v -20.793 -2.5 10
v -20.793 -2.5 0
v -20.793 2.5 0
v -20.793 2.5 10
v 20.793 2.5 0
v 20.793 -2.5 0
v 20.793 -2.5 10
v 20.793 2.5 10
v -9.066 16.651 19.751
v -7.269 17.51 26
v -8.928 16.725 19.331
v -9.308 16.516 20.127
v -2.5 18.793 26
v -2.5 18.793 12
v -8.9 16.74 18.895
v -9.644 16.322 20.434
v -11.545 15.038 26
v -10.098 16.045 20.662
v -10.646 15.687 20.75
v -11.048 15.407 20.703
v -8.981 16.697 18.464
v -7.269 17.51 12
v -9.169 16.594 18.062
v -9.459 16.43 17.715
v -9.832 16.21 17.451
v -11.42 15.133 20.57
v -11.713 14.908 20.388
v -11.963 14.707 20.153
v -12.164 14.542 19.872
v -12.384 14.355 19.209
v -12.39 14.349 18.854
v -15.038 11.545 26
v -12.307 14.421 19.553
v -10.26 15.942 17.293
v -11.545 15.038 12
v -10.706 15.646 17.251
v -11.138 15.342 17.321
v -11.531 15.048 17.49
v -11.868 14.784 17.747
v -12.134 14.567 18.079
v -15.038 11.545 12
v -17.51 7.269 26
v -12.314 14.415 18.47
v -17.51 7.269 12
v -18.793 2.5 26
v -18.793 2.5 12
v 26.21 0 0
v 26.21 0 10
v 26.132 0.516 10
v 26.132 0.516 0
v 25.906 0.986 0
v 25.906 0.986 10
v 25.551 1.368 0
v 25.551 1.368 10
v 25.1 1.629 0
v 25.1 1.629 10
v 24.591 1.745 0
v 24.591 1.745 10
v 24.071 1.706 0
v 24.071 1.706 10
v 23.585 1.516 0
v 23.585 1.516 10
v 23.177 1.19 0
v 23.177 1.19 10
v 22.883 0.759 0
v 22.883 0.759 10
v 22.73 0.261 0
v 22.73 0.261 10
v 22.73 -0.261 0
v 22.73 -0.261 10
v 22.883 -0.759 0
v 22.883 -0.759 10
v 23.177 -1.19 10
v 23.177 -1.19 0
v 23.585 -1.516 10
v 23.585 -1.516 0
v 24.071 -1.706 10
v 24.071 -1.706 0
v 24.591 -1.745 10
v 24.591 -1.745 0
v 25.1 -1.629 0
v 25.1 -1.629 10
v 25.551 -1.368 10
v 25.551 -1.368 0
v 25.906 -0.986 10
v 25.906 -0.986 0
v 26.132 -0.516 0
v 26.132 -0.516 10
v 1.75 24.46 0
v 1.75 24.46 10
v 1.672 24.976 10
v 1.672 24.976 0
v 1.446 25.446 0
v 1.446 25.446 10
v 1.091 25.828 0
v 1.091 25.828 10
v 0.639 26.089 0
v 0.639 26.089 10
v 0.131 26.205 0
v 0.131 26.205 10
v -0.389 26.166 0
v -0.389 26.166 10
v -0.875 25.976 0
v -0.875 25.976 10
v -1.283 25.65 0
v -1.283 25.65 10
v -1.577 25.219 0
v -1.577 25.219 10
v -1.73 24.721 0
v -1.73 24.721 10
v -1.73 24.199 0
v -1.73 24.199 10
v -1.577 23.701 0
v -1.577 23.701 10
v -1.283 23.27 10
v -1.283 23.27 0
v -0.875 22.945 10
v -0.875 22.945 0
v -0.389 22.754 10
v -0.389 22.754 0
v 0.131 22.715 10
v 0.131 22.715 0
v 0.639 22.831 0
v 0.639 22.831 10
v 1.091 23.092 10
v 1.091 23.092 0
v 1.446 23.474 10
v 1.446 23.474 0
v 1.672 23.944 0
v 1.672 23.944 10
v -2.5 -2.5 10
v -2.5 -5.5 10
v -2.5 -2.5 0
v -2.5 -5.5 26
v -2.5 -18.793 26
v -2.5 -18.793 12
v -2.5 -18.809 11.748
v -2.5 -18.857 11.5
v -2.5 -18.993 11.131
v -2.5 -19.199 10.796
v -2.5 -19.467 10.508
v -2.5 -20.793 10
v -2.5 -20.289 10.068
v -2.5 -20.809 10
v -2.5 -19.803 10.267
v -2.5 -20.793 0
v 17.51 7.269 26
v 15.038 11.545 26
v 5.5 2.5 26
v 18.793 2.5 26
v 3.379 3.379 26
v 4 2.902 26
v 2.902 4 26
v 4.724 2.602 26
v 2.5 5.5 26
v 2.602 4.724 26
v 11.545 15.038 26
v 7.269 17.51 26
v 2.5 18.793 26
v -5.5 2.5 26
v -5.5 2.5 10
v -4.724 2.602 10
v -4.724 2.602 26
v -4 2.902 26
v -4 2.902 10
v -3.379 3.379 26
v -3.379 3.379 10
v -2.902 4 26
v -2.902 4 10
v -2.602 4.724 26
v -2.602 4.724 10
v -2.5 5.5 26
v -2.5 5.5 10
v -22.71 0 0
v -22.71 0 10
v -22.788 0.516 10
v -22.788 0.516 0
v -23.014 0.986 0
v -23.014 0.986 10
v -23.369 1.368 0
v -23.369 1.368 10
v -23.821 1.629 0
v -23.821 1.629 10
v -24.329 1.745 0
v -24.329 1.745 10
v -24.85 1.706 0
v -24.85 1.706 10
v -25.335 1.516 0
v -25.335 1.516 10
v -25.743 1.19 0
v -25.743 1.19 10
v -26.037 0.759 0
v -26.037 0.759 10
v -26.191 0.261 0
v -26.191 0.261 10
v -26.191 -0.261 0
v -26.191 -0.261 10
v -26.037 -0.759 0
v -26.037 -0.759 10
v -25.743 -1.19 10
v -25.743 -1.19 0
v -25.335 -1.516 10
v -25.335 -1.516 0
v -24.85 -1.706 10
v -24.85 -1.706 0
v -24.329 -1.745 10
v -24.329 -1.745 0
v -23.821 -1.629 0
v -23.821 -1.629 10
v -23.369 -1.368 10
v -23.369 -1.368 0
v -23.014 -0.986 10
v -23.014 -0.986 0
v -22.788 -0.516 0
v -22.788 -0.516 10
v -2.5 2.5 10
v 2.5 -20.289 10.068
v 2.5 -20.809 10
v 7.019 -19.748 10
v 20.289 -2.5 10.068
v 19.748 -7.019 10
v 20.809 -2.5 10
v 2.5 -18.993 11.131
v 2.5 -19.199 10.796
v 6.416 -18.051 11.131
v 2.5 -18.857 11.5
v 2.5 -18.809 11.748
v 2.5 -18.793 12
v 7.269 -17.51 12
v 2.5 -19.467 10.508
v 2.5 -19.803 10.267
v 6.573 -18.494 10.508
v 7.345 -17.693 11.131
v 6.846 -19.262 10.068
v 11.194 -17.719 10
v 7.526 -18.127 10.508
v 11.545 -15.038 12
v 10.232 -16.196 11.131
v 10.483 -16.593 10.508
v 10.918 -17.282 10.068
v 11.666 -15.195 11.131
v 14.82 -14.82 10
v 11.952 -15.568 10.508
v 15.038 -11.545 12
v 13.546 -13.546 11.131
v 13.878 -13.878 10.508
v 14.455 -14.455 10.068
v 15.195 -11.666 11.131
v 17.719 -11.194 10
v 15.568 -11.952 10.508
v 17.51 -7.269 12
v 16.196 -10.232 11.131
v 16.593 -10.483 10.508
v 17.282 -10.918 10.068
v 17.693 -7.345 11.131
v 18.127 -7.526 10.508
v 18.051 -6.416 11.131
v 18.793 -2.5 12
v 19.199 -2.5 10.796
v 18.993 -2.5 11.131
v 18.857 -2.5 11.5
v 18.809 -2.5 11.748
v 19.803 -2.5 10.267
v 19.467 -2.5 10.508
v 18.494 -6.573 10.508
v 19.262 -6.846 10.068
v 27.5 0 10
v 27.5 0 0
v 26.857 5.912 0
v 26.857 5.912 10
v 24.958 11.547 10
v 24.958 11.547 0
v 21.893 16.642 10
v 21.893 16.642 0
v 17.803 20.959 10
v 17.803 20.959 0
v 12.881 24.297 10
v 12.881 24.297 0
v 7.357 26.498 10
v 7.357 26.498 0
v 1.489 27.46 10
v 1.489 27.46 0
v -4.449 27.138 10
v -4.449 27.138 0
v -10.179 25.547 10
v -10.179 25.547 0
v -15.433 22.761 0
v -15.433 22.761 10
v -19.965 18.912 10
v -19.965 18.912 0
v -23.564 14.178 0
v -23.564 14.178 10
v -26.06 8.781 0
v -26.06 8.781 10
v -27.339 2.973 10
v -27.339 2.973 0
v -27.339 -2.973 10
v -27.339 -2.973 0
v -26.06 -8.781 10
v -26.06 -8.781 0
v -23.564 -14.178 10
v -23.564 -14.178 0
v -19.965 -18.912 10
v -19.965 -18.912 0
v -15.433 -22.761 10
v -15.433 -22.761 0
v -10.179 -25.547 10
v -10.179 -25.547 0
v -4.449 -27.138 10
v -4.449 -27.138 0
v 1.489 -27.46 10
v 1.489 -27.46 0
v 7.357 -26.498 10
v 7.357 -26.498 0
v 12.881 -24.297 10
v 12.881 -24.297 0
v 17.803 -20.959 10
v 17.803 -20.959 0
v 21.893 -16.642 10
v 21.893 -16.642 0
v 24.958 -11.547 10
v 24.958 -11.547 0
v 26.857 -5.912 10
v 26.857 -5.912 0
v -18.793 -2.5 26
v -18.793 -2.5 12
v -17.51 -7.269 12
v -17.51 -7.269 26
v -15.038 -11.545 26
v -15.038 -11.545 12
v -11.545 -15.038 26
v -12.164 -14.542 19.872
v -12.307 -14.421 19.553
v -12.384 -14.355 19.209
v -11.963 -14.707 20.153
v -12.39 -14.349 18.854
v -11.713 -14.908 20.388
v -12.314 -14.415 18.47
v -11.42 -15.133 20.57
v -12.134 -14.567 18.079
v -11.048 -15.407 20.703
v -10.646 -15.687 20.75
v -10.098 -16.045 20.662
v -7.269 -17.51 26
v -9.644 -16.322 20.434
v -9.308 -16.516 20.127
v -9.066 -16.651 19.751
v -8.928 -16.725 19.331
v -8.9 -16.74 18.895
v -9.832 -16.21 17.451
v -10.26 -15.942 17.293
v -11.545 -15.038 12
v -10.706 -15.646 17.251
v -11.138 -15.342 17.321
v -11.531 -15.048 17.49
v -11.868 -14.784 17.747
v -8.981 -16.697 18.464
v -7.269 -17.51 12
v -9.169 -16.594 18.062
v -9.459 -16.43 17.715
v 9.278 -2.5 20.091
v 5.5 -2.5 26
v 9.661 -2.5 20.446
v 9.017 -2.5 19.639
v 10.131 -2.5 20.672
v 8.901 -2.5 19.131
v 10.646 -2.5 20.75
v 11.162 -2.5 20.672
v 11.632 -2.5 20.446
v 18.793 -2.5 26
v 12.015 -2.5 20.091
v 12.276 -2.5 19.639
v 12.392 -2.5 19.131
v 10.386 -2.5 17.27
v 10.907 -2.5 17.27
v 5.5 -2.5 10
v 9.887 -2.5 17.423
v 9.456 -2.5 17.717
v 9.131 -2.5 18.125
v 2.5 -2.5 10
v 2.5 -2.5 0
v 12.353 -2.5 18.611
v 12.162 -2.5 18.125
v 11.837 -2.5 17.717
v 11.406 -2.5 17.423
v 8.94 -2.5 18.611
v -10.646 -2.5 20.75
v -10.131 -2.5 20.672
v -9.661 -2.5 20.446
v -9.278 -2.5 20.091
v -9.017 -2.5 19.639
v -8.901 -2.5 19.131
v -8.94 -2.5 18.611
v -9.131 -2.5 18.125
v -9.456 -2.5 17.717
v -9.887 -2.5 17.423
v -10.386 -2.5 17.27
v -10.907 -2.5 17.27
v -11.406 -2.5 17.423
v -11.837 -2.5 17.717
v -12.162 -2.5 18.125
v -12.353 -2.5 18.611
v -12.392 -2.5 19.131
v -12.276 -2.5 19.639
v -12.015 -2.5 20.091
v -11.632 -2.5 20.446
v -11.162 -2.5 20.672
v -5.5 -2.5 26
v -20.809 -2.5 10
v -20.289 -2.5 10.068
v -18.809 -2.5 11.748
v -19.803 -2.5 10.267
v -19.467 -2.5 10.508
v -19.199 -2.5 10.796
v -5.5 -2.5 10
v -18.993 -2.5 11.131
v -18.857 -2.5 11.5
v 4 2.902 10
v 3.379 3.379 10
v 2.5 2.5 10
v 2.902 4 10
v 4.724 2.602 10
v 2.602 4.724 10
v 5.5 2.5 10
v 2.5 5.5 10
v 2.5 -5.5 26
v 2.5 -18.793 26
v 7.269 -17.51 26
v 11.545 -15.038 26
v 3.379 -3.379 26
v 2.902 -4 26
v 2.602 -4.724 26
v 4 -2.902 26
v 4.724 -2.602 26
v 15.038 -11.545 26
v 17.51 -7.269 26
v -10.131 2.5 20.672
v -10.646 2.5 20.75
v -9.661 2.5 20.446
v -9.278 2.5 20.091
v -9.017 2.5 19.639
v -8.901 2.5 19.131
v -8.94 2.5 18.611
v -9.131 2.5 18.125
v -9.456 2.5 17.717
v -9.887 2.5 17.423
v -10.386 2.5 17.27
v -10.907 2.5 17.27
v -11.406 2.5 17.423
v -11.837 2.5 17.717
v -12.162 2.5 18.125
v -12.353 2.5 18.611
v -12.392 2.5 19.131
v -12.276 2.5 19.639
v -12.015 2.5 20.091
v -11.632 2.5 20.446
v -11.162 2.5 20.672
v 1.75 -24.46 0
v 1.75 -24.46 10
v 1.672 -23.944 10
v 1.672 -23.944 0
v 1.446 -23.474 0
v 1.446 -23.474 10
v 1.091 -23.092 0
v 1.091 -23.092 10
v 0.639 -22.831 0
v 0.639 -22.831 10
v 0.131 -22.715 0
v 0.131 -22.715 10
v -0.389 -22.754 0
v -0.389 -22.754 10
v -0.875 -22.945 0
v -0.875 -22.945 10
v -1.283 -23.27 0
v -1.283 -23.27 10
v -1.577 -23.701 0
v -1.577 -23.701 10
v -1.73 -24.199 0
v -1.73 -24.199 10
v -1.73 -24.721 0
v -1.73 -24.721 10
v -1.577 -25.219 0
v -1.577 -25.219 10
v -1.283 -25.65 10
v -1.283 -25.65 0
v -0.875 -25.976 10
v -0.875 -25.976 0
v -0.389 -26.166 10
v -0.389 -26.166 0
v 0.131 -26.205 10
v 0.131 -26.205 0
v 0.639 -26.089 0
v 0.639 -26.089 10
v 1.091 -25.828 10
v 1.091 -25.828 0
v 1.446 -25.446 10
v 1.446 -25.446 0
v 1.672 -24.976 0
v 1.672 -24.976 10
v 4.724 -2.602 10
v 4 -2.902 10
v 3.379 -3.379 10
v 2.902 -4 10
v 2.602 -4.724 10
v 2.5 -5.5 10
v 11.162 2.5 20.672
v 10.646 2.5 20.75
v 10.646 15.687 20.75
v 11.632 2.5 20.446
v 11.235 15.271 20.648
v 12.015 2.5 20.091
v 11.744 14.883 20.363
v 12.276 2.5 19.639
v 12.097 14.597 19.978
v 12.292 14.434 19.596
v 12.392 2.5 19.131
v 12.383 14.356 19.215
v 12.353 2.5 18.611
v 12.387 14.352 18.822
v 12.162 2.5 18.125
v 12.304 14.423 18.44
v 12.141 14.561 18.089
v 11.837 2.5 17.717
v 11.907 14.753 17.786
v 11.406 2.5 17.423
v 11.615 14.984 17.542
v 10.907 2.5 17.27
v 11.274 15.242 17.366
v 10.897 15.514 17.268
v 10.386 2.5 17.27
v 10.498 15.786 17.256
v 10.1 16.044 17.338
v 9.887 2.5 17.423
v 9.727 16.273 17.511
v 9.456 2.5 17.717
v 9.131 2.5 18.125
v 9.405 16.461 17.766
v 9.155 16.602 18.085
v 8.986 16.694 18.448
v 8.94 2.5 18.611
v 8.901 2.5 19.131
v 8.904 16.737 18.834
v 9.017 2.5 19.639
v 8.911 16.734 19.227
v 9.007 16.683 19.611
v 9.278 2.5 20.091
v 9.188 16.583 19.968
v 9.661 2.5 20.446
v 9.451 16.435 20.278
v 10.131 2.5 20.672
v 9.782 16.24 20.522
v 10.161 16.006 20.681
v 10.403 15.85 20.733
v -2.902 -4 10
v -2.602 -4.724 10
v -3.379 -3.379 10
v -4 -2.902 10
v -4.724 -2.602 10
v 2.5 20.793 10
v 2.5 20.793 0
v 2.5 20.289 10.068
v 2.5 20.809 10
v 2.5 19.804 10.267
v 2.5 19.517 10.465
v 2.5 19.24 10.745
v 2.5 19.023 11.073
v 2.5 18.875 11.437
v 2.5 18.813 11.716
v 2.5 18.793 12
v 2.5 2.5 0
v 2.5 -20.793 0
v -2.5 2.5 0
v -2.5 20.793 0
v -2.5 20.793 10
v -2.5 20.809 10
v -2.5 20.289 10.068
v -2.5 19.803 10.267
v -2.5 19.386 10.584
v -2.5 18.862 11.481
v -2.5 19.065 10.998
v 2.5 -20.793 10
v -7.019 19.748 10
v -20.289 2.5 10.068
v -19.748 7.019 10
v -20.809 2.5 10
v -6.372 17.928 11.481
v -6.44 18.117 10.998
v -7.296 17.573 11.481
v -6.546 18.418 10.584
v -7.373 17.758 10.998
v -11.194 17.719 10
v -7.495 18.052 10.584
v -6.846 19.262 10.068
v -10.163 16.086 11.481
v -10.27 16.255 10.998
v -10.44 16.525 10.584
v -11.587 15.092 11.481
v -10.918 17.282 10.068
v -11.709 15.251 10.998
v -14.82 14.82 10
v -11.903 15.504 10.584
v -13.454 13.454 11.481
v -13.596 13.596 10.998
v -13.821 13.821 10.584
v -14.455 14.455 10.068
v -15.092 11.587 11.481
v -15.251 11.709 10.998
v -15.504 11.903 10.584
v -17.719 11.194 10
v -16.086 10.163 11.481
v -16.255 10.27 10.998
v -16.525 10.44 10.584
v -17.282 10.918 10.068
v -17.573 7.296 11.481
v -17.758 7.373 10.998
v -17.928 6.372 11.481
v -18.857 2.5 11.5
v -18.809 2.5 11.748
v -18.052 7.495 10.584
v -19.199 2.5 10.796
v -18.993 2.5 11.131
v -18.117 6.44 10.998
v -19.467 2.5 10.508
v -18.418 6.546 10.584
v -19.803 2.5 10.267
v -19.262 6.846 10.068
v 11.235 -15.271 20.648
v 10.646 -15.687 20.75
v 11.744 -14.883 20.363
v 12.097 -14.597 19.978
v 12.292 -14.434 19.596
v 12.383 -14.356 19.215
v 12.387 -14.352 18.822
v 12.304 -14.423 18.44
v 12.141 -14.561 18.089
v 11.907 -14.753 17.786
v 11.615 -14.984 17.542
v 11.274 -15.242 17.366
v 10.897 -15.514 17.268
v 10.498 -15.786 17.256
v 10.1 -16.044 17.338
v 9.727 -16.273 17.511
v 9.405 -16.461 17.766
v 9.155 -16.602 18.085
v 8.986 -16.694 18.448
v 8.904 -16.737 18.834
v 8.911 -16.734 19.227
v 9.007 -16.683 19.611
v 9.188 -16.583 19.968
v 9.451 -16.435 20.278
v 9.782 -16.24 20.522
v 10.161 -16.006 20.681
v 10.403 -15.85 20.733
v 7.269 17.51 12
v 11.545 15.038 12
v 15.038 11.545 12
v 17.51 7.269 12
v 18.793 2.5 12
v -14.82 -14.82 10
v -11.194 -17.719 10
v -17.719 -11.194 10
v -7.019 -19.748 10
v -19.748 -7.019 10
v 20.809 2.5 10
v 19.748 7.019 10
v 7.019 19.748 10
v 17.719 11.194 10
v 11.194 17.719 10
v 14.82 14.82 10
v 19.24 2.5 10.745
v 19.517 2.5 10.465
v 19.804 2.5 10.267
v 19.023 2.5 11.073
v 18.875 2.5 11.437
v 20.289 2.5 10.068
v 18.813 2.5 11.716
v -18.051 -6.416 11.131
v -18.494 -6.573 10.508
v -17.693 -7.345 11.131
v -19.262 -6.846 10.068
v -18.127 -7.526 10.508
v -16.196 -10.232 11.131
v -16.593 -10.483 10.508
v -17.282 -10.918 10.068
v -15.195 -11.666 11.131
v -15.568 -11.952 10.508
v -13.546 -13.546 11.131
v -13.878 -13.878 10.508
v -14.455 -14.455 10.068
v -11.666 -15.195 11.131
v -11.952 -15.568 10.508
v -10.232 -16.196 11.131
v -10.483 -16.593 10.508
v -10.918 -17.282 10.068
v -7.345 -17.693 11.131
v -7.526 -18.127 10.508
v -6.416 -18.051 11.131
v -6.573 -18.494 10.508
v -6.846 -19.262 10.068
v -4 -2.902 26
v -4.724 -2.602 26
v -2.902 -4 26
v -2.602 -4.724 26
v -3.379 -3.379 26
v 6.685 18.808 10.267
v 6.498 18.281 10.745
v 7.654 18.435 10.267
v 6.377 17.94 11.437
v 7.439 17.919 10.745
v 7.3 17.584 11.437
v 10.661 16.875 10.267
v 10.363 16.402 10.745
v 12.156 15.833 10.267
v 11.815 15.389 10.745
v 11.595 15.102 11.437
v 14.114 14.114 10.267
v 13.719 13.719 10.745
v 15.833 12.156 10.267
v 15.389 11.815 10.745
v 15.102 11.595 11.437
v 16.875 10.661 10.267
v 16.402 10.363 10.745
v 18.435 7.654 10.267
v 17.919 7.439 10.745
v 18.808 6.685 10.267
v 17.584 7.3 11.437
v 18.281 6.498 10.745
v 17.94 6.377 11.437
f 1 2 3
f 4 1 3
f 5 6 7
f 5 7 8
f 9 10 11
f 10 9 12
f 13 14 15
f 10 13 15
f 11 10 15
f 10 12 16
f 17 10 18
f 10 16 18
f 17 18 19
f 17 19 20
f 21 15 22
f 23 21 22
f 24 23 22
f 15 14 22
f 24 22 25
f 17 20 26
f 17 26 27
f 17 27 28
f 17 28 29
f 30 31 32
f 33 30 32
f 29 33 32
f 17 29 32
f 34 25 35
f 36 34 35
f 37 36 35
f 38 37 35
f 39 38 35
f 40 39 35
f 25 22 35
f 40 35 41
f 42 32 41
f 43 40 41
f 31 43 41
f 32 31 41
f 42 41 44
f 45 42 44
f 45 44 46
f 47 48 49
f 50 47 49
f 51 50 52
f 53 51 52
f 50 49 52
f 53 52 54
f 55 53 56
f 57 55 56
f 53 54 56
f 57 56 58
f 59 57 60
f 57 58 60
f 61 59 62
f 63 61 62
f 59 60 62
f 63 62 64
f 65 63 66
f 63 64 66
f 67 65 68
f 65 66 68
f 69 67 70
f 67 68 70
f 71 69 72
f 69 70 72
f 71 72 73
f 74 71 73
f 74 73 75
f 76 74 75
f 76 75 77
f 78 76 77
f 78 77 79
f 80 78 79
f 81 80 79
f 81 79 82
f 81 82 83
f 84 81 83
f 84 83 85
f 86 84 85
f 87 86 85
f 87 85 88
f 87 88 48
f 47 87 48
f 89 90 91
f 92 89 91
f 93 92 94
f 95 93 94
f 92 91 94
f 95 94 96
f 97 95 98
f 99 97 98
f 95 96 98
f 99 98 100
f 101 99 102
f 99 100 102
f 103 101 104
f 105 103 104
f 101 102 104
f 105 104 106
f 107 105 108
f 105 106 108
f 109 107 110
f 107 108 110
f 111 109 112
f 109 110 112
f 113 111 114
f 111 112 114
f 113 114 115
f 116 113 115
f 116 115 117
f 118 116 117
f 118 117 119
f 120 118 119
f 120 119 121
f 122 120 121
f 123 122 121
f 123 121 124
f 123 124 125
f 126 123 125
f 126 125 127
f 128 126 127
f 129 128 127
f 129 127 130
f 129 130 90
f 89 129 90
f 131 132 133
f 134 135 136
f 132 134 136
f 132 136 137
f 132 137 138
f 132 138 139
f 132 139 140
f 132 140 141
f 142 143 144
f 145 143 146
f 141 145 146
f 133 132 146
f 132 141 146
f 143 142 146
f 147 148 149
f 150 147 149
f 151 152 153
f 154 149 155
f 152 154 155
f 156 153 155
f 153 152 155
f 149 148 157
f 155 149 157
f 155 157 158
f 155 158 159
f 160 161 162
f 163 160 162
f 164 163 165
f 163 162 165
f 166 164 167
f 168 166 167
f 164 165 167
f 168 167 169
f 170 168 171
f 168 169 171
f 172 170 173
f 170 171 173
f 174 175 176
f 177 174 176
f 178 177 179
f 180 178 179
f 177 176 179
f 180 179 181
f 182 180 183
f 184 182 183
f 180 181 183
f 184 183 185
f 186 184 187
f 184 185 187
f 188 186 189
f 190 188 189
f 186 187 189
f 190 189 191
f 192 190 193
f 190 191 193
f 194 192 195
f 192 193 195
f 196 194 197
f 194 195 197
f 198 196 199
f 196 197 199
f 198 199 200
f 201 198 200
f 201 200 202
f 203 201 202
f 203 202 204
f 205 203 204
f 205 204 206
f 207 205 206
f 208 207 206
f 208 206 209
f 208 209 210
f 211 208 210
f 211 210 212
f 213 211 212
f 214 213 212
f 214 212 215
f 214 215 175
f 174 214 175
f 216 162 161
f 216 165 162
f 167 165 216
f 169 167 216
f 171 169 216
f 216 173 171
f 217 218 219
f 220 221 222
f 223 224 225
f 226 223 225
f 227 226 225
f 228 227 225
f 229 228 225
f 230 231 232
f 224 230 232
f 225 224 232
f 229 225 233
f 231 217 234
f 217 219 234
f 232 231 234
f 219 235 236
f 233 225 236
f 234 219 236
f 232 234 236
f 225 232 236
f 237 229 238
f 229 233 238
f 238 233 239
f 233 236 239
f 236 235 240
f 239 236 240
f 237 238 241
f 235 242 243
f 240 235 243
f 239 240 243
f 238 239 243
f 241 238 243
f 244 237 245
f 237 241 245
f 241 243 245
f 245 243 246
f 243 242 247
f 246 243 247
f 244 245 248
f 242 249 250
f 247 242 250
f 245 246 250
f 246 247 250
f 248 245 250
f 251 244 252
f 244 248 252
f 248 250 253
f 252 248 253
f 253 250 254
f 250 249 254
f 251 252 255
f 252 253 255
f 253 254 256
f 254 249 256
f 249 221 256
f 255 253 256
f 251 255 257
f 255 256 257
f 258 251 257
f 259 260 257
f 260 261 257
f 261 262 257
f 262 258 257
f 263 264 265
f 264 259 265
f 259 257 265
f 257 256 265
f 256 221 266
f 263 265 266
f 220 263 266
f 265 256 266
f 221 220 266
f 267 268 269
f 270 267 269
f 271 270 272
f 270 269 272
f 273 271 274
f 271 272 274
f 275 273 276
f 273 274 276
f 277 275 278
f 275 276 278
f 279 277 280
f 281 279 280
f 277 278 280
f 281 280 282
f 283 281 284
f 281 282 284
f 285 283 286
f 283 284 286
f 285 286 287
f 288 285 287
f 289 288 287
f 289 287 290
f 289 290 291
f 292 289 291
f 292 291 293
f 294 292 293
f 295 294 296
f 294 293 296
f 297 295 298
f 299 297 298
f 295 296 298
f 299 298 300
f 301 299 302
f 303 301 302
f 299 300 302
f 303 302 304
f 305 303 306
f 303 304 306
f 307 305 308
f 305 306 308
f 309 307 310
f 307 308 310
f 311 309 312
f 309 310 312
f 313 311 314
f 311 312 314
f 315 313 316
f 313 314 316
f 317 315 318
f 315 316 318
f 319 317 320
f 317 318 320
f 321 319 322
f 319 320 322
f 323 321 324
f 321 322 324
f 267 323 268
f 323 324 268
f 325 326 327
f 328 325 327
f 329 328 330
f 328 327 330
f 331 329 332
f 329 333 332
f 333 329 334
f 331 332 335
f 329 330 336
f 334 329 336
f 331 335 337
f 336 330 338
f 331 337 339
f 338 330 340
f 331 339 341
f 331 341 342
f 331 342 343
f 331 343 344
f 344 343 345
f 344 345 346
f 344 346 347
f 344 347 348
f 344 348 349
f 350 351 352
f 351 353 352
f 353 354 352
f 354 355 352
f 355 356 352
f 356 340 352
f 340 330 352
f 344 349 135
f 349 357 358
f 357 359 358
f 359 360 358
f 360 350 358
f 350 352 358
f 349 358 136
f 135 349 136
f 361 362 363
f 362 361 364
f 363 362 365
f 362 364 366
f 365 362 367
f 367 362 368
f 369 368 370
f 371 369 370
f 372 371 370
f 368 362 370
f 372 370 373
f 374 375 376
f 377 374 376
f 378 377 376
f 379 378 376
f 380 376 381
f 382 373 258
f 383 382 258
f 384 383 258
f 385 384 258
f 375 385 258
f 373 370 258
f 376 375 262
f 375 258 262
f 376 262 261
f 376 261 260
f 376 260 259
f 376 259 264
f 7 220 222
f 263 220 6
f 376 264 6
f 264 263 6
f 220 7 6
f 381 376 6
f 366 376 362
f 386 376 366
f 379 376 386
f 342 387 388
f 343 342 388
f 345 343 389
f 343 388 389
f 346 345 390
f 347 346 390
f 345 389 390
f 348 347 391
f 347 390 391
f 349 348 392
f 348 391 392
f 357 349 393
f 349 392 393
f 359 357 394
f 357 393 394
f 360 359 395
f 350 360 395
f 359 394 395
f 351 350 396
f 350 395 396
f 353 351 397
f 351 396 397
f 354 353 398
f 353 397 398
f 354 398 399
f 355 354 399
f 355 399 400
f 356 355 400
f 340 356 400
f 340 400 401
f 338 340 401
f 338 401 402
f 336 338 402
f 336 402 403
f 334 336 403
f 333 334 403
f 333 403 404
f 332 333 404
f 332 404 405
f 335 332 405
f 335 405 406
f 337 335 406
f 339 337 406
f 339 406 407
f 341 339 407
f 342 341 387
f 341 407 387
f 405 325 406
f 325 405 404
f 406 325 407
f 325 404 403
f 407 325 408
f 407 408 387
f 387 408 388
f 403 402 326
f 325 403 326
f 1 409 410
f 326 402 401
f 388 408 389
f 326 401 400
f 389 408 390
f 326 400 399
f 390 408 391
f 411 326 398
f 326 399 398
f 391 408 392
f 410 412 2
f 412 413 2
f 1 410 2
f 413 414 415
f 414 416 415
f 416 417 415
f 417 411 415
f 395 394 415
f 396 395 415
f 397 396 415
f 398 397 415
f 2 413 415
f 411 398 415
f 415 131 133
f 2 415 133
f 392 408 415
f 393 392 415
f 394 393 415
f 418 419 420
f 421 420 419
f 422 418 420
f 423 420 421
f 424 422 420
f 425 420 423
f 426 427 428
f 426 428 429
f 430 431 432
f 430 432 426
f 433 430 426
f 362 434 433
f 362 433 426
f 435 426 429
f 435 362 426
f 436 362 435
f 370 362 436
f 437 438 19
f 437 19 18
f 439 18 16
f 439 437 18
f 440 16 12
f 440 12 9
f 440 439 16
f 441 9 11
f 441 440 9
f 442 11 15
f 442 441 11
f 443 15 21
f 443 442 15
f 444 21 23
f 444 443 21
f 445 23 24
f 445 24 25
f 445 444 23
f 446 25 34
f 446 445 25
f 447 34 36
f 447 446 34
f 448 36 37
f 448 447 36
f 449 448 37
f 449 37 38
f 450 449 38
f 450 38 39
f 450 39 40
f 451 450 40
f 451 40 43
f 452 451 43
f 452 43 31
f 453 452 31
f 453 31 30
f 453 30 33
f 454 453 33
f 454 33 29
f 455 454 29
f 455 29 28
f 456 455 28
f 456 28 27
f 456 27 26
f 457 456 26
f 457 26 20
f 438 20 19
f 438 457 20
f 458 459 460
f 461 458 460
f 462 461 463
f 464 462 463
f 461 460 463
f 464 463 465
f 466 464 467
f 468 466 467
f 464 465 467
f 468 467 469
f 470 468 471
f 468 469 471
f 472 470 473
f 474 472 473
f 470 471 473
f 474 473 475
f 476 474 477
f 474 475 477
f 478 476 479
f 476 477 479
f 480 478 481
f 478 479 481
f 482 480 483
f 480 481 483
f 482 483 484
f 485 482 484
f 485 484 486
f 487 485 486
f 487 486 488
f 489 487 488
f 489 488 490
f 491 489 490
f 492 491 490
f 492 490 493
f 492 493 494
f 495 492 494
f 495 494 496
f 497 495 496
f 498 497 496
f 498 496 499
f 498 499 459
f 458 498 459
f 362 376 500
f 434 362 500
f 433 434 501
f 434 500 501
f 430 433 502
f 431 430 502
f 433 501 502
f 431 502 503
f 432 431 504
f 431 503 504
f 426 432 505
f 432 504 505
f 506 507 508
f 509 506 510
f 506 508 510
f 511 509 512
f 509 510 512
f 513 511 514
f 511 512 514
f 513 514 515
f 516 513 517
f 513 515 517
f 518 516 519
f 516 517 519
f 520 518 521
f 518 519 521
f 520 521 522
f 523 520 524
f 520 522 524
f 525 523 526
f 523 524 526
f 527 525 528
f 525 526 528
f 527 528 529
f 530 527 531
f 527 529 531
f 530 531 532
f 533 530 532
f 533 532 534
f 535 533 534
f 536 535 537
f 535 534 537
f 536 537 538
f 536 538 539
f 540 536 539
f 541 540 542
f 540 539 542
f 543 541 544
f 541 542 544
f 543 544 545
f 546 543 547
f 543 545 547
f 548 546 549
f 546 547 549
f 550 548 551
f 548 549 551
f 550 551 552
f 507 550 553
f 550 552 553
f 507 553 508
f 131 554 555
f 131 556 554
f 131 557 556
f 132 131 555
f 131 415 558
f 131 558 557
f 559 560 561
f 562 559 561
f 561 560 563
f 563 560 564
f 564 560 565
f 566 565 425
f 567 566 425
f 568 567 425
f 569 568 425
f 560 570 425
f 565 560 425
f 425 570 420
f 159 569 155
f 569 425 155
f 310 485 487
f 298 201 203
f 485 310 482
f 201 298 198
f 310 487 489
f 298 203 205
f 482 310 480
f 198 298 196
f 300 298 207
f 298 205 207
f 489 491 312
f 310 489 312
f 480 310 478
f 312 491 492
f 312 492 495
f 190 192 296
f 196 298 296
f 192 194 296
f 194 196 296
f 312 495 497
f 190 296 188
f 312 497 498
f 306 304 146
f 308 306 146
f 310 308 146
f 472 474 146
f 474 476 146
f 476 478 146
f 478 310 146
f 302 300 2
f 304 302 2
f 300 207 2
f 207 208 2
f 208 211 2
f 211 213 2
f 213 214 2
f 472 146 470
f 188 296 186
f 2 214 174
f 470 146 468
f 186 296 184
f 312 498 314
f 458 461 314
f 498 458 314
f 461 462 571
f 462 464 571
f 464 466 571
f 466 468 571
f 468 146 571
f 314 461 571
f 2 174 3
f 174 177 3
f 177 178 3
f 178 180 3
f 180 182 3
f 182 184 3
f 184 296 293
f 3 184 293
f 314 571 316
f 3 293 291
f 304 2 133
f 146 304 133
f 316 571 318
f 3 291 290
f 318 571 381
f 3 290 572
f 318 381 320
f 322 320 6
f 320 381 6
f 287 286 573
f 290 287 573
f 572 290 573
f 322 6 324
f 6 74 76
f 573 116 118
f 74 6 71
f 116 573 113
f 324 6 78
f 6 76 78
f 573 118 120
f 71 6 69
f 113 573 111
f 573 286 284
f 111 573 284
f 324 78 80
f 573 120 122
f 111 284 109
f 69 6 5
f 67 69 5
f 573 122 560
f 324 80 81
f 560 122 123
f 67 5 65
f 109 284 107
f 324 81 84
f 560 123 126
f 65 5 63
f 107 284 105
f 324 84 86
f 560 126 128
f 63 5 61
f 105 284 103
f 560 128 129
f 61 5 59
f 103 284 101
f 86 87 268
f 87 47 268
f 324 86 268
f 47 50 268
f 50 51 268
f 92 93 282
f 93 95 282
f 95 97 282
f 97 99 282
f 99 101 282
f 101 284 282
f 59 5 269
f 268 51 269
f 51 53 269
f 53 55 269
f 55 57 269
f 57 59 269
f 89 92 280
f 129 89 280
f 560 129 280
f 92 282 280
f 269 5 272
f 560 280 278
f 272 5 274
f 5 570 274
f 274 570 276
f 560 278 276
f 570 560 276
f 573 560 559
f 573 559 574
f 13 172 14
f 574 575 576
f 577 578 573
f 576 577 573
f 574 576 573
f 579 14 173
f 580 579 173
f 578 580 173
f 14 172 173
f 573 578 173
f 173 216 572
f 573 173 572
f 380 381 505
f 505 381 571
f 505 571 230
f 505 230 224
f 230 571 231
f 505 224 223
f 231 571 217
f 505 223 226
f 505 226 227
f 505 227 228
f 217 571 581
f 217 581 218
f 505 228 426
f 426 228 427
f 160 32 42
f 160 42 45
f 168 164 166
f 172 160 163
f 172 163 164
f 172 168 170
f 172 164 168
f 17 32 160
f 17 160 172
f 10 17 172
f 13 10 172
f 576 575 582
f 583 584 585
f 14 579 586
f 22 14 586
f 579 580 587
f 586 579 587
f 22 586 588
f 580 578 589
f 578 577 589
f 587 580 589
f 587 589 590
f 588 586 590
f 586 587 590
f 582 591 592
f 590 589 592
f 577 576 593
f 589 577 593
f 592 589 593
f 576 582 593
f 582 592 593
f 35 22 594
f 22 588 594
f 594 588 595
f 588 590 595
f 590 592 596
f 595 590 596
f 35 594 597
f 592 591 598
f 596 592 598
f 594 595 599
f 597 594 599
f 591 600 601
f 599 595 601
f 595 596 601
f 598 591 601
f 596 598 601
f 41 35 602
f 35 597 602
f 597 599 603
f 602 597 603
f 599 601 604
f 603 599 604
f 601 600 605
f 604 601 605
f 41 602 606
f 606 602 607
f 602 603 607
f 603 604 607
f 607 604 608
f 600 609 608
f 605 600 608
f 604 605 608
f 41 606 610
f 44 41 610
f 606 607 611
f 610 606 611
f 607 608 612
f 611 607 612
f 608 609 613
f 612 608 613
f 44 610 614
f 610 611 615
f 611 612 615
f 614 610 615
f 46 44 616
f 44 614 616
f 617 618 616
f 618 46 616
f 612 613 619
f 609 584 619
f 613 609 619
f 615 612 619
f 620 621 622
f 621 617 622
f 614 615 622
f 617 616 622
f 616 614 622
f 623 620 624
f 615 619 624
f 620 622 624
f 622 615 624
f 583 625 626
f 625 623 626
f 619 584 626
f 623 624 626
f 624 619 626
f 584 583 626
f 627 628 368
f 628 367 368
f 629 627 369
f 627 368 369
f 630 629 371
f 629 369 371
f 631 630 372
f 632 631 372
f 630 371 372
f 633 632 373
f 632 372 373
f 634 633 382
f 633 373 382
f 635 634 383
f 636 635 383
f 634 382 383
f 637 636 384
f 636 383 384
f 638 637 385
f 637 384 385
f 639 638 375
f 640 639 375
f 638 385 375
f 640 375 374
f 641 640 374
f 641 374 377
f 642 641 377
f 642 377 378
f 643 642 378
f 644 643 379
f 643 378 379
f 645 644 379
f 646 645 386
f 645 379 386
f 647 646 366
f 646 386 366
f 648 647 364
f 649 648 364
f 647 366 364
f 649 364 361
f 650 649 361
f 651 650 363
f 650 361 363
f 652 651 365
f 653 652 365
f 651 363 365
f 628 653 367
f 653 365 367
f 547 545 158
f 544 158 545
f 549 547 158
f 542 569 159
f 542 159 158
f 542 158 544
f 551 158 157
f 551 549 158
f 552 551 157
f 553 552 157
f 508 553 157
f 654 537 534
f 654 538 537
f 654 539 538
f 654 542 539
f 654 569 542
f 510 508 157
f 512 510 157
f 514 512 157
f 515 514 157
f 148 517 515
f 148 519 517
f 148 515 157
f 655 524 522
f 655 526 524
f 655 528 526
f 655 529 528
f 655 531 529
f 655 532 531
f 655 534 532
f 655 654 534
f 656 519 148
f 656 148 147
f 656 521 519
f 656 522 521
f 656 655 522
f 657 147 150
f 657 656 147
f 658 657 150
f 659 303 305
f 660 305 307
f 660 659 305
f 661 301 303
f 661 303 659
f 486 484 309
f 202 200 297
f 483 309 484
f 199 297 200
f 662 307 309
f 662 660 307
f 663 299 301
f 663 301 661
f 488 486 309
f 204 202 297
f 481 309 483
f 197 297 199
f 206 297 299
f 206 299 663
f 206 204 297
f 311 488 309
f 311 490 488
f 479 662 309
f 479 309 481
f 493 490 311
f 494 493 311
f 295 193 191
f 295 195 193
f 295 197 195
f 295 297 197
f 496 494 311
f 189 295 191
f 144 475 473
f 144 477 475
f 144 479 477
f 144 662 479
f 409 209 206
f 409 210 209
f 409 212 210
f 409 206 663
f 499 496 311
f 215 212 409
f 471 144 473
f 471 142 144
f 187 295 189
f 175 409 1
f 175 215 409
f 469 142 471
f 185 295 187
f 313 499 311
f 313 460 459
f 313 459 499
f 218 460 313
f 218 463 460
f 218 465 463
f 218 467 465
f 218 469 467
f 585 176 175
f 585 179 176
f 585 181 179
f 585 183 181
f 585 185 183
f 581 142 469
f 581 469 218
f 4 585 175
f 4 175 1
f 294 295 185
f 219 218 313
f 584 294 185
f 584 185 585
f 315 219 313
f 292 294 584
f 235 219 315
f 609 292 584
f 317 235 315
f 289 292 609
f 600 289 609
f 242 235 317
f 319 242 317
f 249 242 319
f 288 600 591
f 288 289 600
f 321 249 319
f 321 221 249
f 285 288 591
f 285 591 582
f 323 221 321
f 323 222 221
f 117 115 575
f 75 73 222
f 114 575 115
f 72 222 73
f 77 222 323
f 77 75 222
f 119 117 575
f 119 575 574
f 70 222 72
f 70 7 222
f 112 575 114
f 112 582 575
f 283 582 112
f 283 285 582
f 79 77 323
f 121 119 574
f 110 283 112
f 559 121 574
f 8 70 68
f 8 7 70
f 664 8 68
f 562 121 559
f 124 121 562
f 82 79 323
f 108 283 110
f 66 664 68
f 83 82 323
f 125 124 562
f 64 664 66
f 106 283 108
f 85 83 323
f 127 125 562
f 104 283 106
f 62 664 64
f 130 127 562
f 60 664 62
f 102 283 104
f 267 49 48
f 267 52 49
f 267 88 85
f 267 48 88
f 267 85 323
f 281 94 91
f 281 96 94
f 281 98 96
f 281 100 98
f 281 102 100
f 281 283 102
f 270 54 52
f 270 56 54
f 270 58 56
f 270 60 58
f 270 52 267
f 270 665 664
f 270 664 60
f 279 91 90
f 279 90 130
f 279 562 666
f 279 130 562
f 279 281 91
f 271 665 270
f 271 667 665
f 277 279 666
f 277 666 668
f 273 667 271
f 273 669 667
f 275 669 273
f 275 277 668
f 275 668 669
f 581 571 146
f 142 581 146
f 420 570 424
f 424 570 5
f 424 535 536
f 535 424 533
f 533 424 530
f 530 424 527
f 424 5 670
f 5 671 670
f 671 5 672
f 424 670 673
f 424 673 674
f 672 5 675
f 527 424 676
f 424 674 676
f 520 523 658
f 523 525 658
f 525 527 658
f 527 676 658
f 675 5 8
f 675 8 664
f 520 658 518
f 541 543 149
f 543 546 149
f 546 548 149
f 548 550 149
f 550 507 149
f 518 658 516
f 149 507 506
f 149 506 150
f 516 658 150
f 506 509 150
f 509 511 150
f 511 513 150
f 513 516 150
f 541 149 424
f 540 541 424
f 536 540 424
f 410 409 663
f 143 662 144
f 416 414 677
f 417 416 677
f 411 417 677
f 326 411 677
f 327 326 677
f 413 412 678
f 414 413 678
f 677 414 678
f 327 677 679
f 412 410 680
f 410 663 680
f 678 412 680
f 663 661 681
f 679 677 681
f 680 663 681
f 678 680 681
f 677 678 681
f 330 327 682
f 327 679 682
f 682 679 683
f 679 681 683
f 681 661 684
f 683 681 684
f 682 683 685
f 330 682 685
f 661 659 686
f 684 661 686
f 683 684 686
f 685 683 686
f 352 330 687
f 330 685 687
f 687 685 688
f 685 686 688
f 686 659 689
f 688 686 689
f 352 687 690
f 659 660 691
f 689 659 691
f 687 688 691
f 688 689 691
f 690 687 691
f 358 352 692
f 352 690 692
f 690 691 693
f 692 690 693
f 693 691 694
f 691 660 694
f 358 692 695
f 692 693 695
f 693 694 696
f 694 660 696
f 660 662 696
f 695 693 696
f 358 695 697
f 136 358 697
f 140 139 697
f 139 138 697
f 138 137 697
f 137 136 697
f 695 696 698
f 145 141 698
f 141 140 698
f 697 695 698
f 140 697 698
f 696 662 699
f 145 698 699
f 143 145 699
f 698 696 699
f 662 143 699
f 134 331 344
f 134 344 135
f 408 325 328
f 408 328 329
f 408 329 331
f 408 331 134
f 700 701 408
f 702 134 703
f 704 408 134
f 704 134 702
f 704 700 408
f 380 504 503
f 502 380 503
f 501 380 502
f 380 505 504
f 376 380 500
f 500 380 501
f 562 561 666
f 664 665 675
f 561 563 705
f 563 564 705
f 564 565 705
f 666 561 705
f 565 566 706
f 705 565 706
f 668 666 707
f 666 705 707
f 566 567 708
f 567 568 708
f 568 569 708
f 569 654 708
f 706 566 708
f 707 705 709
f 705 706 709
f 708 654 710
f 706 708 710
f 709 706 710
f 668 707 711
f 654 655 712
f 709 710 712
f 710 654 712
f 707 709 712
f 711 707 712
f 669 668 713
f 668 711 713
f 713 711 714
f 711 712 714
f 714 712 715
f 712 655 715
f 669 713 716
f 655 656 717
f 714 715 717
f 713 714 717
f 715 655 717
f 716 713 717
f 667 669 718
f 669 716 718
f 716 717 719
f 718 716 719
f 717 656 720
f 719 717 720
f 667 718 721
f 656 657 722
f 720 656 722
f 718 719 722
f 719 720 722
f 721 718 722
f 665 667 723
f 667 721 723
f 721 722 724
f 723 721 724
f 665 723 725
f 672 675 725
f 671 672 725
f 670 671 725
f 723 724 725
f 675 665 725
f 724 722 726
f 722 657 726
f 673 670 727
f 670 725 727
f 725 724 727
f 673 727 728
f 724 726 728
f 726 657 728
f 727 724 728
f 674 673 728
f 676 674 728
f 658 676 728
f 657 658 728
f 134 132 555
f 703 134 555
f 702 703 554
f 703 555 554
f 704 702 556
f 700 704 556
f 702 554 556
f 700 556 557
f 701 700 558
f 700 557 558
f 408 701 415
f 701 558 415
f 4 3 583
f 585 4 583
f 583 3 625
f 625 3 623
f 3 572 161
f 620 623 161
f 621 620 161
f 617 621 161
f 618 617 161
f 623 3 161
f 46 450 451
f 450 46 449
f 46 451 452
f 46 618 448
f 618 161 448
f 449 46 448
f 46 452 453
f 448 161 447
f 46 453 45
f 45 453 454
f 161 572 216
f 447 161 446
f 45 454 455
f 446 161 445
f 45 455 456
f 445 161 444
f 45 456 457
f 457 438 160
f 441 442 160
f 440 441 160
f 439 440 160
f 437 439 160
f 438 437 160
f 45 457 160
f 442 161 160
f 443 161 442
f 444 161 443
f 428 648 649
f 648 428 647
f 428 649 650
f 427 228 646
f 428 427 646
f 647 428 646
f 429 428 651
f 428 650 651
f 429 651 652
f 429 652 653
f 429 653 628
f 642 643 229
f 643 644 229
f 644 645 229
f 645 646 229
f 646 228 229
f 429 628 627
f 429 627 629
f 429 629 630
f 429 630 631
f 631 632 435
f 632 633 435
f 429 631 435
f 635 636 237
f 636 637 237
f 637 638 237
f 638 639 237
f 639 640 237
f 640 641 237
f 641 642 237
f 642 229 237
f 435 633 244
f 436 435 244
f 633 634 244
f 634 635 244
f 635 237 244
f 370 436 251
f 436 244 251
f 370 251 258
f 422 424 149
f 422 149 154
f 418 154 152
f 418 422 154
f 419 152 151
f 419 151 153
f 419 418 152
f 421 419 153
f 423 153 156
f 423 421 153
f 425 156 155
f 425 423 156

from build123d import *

# Parameters (mm, degrees)
SKETCH_1_R          = 27.5
EXTRUDE_1_DEPTH     = 10
EXTRUDE_2_DEPTH     = 16
CUT_EXTRUDE_3_DEPTH = 20
FILLET_3_R          = 2
SKETCH_7_W          = 2
SKETCH_7_H          = 5
SKETCH_7_W_2        = 5
SKETCH_7_H_2        = 2
CUT_EXTRUDE_4_DEPTH = 20
SKETCH_8_R          = 1.75
CUT_EXTRUDE_5_DEPTH = 20
SKETCH_9_R          = 1.75
CUT_EXTRUDE_6_DEPTH = 30.5


with BuildPart() as part:
    # 草图1 → 凸台-拉伸1 (new body)
    with BuildSketch(Plane.XY):
        Circle(SKETCH_1_R)
    extrude(amount=EXTRUDE_1_DEPTH)

    # 草图2 → 凸台-拉伸2 (add)
    with BuildSketch(Plane.XY.offset(10)):
        with BuildLine():
            Line((-2.5, 5.5), (-2.5, 17.5))
            Line((-2.5, 17.5), (-2.5, 18.792973669))
            ThreePointArc((-2.5, 18.792973669), (-13.405705116, 13.405705116), (-18.792973669, 2.5))
            Line((-18.792973669, 2.5), (-17.5, 2.5))
            Line((-17.5, 2.5), (-5.5, 2.5))
            ThreePointArc((-5.5, 2.5), (-3.378679656, 3.378679656), (-2.5, 5.5))
        make_face()
        with BuildLine():
            Line((17.5, -2.5), (5.5, -2.5))
            ThreePointArc((5.5, -2.5), (3.378679656, -3.378679656), (2.5, -5.5))
            Line((2.5, -5.5), (2.5, -17.5))
            Line((2.5, -17.5), (2.5, -18.792973669))
            ThreePointArc((2.5, -18.792973669), (13.405705116, -13.405705116), (18.792973669, -2.5))
            Line((18.792973669, -2.5), (17.5, -2.5))
        make_face()
        with BuildLine():
            Line((17.5, 2.5), (5.5, 2.5))
            ThreePointArc((5.5, 2.5), (3.378679656, 3.378679656), (2.5, 5.5))
            Line((2.5, 5.5), (2.5, 17.5))
            Line((2.5, 17.5), (2.5, 18.792973669))
            ThreePointArc((2.5, 18.792973669), (13.405705116, 13.405705116), (18.792973669, 2.5))
            Line((18.792973669, 2.5), (17.5, 2.5))
        make_face()
        with BuildLine():
            Line((-2.5, -17.5), (-2.5, -5.5))
            ThreePointArc((-2.5, -5.5), (-3.378679656, -3.378679656), (-5.5, -2.5))
            Line((-5.5, -2.5), (-17.5, -2.5))
            Line((-17.5, -2.5), (-18.792973669, -2.5))
            ThreePointArc((-18.792973669, -2.5), (-13.405705116, -13.405705116), (-2.5, -18.792973669))
            Line((-2.5, -18.792973669), (-2.5, -17.5))
        make_face()
    extrude(amount=EXTRUDE_2_DEPTH)

    # 草图6 → 切除-拉伸3 (cut)
    with BuildSketch(Plane.XY.offset(10)):
        Polygon((18.792973669, -2.5), (5.5, -2.5), (2.5, -2.5), (2.5, -5.5), (2.5, -18.792973669), (-2.5, -18.792973669), (-2.5, -5.5), (-2.5, -2.5), (-5.5, -2.5), (-18.792973669, -2.5), (-18.792973669, 2.5), (-5.5, 2.5), (-2.5, 2.5), (-2.5, 5.5), (-2.5, 18.792973669), (2.5, 18.792973669), (2.5, 5.5), (2.5, 2.5), (5.5, 2.5), (18.792973669, 2.5), align=None)
    extrude(amount=-CUT_EXTRUDE_3_DEPTH, mode=Mode.SUBTRACT)

    # 圆角3
    # the kernel refuses this fillet: 2 mm, written as the material it adds along each edge
    with BuildSketch(Plane(origin=(0, 0, 10), x_dir=(-0.13117570134694587, -0.9913591354177037, 0), z_dir=(-0.9913591354177037, 0.13117570134694587, 0))) as fillet_3_piece_1_section:
        with BuildLine():
            CenterArc((18.958529988 + FILLET_3_R, FILLET_3_R), FILLET_3_R, 180, 90)
            Line((18.958529988, FILLET_3_R), (18.958529988, 0))
            Line((18.958529988, 0), (18.958529988 + FILLET_3_R, 0))
        make_face()
    fillet_3_piece_1 = revolve(axis=Axis((0, 0, 10), (0, 0, 1)), revolution_arc=105.075073745, mode=Mode.PRIVATE)
    fillet_3_piece_1 = split(fillet_3_piece_1, bisect_by=Plane(origin=(2.5, -19.248904349, 10.242638579), z_dir=(1, 0, 0)), keep=Keep.TOP, mode=Mode.PRIVATE)
    fillet_3_piece_1 = split(fillet_3_piece_1, bisect_by=Plane(origin=(4.206837789, -2.5, 10.242638579), z_dir=(0, -1, 0)), keep=Keep.TOP, mode=Mode.PRIVATE)
    add(fillet_3_piece_1)
    with BuildSketch(Plane(origin=(0, 0, 10), x_dir=(-0.13117570134694623, 0.9913591354177035, 0), z_dir=(-0.9913591354177035, -0.13117570134694623, 0))) as fillet_3_piece_2_section:
        with BuildLine():
            CenterArc((18.958529988 + FILLET_3_R, -FILLET_3_R), FILLET_3_R, 90, 90)
            Line((18.958529988, -FILLET_3_R), (18.958529988, 0))
            Line((18.958529988, 0), (18.958529988 + FILLET_3_R, 0))
        make_face()
    fillet_3_piece_2 = revolve(axis=Axis((0, 0, 10), (0, 0, -1)), revolution_arc=105.075073745, mode=Mode.PRIVATE)
    fillet_3_piece_2 = split(fillet_3_piece_2, bisect_by=Plane(origin=(4.206838505, 2.5, 10.242637951), z_dir=(0, 1, 0)), keep=Keep.TOP, mode=Mode.PRIVATE)
    fillet_3_piece_2 = split(fillet_3_piece_2, bisect_by=Plane(origin=(2.5, 19.24890412, 10.242637951), z_dir=(1, 0, 0)), keep=Keep.TOP, mode=Mode.PRIVATE)
    add(fillet_3_piece_2)
    with BuildSketch(Plane(origin=(0, 0, 10), x_dir=(-0.9913591354177035, 0.13117570134694678, 0), z_dir=(0.13117570134694678, 0.9913591354177035, 0))) as fillet_3_piece_3_section:
        with BuildLine():
            CenterArc((18.958529988 + FILLET_3_R, FILLET_3_R), FILLET_3_R, 180, 90)
            Line((18.958529988, FILLET_3_R), (18.958529988, 0))
            Line((18.958529988, 0), (18.958529988 + FILLET_3_R, 0))
        make_face()
    fillet_3_piece_3 = revolve(axis=Axis((0, 0, 10), (0, 0, 1)), revolution_arc=105.075073745, mode=Mode.PRIVATE)
    fillet_3_piece_3 = split(fillet_3_piece_3, bisect_by=Plane(origin=(-19.248904349, -2.5, 10.242638579), z_dir=(0, -1, 0)), keep=Keep.TOP, mode=Mode.PRIVATE)
    fillet_3_piece_3 = split(fillet_3_piece_3, bisect_by=Plane(origin=(-2.5, -4.206837789, 10.242638579), z_dir=(-1, 0, 0)), keep=Keep.TOP, mode=Mode.PRIVATE)
    add(fillet_3_piece_3)
    with BuildSketch(Plane(origin=(0, 0, 10), x_dir=(0.13117570134694595, 0.9913591354177037, 0), z_dir=(0.9913591354177037, -0.13117570134694595, 0))) as fillet_3_piece_4_section:
        with BuildLine():
            CenterArc((18.958529988 + FILLET_3_R, FILLET_3_R), FILLET_3_R, 180, 90)
            Line((18.958529988, FILLET_3_R), (18.958529988, 0))
            Line((18.958529988, 0), (18.958529988 + FILLET_3_R, 0))
        make_face()
    fillet_3_piece_4 = revolve(axis=Axis((0, 0, 10), (0, 0, 1)), revolution_arc=105.075073745, mode=Mode.PRIVATE)
    fillet_3_piece_4 = split(fillet_3_piece_4, bisect_by=Plane(origin=(-2.5, 19.248904349, 10.242638579), z_dir=(-1, 0, 0)), keep=Keep.TOP, mode=Mode.PRIVATE)
    fillet_3_piece_4 = split(fillet_3_piece_4, bisect_by=Plane(origin=(-4.206837789, 2.5, 10.242638579), z_dir=(0, 1, 0)), keep=Keep.TOP, mode=Mode.PRIVATE)
    add(fillet_3_piece_4)

    # 草图7 → 切除-拉伸4 (cut)
    with BuildSketch(Plane(origin=(0, 0, 0), x_dir=(-1, 0, 0), z_dir=(0, 0, -1))):
        with Locations((19.792973669, 0)):
            Rectangle(SKETCH_7_W, SKETCH_7_H)
        with Locations((0, -19.792973669)):
            Rectangle(SKETCH_7_W_2, SKETCH_7_H_2)
        with Locations((-19.792973669, 0)):
            Rectangle(SKETCH_7_W, SKETCH_7_H)
        with Locations((0, 19.792973669)):
            Rectangle(SKETCH_7_W_2, SKETCH_7_H_2)
    extrude(amount=-CUT_EXTRUDE_4_DEPTH, mode=Mode.SUBTRACT)

    # 草图8 → 切除-拉伸5 (cut)
    with BuildSketch(Plane.XY.offset(10)):
        with Locations((0, 24.460175936)):
            Circle(SKETCH_8_R)
        with Locations((24.460175936, 0)):
            Circle(SKETCH_8_R)
        with Locations((0, -24.460175936)):
            Circle(SKETCH_8_R)
        with Locations((-24.460175936, 0)):
            Circle(SKETCH_8_R)
    extrude(amount=-CUT_EXTRUDE_5_DEPTH, mode=Mode.SUBTRACT)

    # 草图9 → 切除-拉伸6 (cut, symmetric)
    with BuildSketch(Plane(origin=(0, 0, 0), x_dir=(1, 0, 0), z_dir=(0, 1, 0))):
        with Locations(Location((-10.646486834, -19, 0), (0, 0, 270))):
            Circle(SKETCH_9_R)
        with Locations(Location((10.646486834, -19, 0), (0, 0, 270))):
            Circle(SKETCH_9_R)
    extrude(amount=CUT_EXTRUDE_6_DEPTH, both=True, mode=Mode.SUBTRACT)


solid = part.part
